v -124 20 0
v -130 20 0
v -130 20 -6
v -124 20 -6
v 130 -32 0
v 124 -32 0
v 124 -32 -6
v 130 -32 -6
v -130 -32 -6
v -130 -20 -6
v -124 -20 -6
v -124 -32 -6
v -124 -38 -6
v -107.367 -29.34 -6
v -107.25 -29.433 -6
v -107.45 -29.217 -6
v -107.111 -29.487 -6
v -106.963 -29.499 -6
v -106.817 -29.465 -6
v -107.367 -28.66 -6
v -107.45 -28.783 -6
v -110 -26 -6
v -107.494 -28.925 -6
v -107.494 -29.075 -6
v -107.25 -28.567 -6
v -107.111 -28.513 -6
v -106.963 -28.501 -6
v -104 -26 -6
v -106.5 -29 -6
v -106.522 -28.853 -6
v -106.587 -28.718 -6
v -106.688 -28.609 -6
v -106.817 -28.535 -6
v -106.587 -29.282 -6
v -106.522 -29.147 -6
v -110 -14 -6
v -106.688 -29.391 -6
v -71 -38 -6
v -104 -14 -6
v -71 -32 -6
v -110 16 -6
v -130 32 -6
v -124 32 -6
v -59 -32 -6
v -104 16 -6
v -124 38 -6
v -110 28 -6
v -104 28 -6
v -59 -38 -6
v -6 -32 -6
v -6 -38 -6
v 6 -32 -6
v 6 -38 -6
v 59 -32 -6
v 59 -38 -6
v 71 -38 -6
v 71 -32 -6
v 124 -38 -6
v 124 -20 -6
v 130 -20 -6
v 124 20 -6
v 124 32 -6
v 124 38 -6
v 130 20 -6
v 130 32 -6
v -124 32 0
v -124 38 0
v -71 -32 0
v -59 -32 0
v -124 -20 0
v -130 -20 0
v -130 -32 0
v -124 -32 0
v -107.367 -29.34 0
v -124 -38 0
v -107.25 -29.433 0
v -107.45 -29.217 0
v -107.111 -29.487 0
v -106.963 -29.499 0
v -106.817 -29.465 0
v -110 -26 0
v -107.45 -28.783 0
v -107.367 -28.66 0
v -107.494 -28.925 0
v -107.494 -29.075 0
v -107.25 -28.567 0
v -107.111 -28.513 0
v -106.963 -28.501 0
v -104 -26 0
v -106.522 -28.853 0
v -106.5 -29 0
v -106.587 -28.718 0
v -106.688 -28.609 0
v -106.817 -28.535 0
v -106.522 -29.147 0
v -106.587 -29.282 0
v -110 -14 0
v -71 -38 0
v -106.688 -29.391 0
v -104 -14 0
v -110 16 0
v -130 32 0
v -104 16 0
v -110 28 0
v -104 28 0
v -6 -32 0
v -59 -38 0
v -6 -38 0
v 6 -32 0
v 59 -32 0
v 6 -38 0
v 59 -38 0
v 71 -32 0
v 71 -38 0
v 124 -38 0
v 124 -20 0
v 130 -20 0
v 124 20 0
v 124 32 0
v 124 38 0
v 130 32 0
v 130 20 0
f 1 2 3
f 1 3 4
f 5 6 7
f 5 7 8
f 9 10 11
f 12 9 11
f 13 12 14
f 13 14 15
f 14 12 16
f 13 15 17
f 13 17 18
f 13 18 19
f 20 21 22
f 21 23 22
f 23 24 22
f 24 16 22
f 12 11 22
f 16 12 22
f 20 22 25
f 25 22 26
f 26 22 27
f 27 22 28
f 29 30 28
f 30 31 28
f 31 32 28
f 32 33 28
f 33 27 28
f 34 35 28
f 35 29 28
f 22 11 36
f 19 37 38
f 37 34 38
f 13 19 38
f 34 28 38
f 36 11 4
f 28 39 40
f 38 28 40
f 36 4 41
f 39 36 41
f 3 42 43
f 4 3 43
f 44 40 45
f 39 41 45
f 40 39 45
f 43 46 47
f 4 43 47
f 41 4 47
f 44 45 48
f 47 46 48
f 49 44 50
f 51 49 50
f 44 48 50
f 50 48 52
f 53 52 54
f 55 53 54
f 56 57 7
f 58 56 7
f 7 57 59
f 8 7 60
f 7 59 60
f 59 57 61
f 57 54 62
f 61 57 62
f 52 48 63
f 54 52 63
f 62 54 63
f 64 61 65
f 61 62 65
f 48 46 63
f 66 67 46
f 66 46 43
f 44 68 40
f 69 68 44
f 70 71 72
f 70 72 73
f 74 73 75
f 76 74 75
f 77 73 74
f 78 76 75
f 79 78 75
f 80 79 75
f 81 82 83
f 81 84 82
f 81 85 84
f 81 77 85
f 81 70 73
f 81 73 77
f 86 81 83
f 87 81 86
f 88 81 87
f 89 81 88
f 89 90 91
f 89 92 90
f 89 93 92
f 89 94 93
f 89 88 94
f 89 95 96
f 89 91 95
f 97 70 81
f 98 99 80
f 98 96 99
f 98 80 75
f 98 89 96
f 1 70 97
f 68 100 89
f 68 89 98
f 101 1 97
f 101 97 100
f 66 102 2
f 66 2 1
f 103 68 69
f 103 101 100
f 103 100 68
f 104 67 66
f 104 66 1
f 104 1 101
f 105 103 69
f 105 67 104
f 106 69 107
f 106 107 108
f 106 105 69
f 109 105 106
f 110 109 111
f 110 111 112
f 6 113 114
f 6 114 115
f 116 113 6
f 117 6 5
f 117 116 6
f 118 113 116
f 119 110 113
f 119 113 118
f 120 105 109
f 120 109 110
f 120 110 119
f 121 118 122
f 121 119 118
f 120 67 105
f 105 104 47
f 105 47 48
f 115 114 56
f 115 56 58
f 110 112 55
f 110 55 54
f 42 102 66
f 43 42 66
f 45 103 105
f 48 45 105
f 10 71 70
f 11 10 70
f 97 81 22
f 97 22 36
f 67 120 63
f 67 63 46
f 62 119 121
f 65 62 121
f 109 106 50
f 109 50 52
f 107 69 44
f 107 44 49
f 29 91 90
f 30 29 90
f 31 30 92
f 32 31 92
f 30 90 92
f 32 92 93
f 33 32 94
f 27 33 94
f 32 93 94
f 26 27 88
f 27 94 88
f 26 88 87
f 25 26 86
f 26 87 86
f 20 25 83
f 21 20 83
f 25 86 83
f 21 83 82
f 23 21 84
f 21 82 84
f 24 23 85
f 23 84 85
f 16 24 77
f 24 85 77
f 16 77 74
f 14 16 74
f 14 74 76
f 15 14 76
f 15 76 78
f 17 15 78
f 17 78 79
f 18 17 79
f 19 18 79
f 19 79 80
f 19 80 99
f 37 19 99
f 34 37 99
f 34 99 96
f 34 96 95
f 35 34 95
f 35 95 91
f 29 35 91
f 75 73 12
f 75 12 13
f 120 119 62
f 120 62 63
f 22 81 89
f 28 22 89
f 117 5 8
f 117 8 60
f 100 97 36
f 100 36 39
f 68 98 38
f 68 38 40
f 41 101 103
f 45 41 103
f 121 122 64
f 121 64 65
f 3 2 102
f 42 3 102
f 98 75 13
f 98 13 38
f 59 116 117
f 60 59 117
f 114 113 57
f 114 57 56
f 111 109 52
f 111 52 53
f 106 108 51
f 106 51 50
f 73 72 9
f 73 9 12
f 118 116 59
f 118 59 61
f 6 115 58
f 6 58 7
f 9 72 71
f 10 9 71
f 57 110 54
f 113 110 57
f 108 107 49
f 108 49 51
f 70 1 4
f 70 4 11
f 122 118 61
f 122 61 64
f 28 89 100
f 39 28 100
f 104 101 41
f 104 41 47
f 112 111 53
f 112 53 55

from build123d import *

# Parameters (mm, degrees)
SKETCH1_W           = 6
SKETCH1_H           = 12
BOSS_EXTRUDE1_DEPTH = 6
SKETCH3_R           = 0.5
CUT_EXTRUDE1_DEPTH  = 7


with BuildPart() as part:
    # Sketch1 → Boss-Extrude1 (new body)
    with BuildSketch(Plane.XY):
        Polygon((-124, 38), (-124, 32), (-124, 20), (-124, -20), (-124, -32), (-124, -38), (-71, -38), (-71, -32), (-59, -32), (-59, -38), (-6, -38), (-6, -32), (6, -32), (6, -38), (59, -38), (59, -32), (71, -32), (71, -38), (124, -38), (124, -32), (124, -20), (124, 20), (124, 32), (124, 38), align=None)
        with Locations((-107, -20)):
            Rectangle(SKETCH1_W, SKETCH1_H, mode=Mode.SUBTRACT)
        with Locations((-107, 22)):
            Rectangle(SKETCH1_W, SKETCH1_H, mode=Mode.SUBTRACT)
        with Locations((-127, -26)):
            Rectangle(SKETCH1_W, SKETCH1_H)
        with Locations((-127, 26)):
            Rectangle(SKETCH1_W, SKETCH1_H)
        with Locations((127, 26)):
            Rectangle(SKETCH1_W, SKETCH1_H)
        with Locations((127, -26)):
            Rectangle(SKETCH1_W, SKETCH1_H)
    extrude(amount=-BOSS_EXTRUDE1_DEPTH)

    # Sketch3 → Cut-Extrude1 (cut, through all)
    with BuildSketch(Plane.XY):
        with Locations((-107, -29)):
            Circle(SKETCH3_R)
    extrude(amount=-CUT_EXTRUDE1_DEPTH, mode=Mode.SUBTRACT)


solid = part.part
